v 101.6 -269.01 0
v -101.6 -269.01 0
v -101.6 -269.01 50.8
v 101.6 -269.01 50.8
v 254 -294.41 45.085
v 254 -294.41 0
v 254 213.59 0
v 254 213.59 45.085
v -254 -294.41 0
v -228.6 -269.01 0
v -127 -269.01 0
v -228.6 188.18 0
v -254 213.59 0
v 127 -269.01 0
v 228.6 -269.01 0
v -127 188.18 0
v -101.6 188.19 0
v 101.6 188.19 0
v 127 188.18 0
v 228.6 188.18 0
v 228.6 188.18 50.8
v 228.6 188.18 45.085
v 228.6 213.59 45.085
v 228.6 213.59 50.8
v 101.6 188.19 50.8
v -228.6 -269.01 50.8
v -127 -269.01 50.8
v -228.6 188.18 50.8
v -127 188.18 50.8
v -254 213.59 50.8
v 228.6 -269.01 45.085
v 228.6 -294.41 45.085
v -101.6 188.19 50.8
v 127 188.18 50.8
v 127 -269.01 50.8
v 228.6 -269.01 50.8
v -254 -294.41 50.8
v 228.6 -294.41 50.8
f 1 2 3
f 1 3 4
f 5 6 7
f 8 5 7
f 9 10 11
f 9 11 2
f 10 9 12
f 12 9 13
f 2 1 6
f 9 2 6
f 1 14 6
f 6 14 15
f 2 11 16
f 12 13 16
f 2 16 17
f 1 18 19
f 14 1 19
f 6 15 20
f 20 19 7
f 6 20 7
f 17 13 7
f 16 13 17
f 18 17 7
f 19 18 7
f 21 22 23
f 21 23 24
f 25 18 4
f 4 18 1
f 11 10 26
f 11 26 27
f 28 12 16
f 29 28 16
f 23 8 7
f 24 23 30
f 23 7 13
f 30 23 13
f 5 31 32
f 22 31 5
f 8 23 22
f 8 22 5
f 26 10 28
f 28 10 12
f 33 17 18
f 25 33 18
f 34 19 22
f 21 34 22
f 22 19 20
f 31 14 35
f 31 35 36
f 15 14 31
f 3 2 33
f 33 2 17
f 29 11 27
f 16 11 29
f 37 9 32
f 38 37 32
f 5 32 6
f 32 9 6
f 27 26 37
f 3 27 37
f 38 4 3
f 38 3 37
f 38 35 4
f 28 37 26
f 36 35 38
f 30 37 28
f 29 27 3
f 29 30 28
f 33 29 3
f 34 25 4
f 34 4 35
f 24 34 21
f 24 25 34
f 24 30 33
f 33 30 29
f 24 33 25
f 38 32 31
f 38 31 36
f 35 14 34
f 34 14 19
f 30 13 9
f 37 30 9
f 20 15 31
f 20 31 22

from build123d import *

# Parameters (mm, degrees)
F0_W        = 101.6
F0_H        = 457.1899072886
F0_W_2      = 203.2
F0_H_2      = 25.4
F1_DEPTH    = 50.8
F2_T        = 45.085
F2_T3_DEPTH = 140.97


# Not quite as in the source:
# - a shell that OpenCascade refuses in one call is made with other operations: the cavity is built on its own and cut out


with BuildPart() as f1:
    # F0 (on Top) → F1 (new body)
    with BuildSketch(Plane.XY):
        Polygon((-228.6, 213.5899730921), (-254, 213.5899730921), (-254, 188.1798803806), (-254, -213.5899730921), (-254, -294.4100269079), (-228.6, -294.4100269079), (-127, -294.4100269079), (-101.6, -294.4100269079), (-101.6, -269.0100269079), (-101.6, 188.1798803806), (-101.6, 188.1899730921), (101.6, 188.1899730921), (101.6, -269.0100269079), (101.6, -294.4100269079), (254, -294.4100269079), (254, -269.0100269079), (254, 213.5899730921), (101.6, 213.5899730921), (-101.6, 213.5899730921), (-127, 213.5899730921), align=None)
        with Locations((-177.8, -40.4150732636)):
            Rectangle(F0_W, F0_H, mode=Mode.SUBTRACT)
        with Locations((177.8, -40.4150732636)):
            Rectangle(F0_W, F0_H, mode=Mode.SUBTRACT)
        with Locations((0, -281.7100269079)):
            Rectangle(F0_W_2, F0_H_2)
    extrude(amount=F1_DEPTH)

    # F2: shell of thickness 45.085, made by hand


with BuildPart() as f2_core1:
    # F2_t2: copy of F1
    add(f1.part)

    # the walls: a layer under each face that stays
    f2_faces = [f2_core1.faces().sort_by_distance(p)[0] for p in [
        (-101.6, -40.4100269079, 25.4),
        (0, 188.1899730921, 25.4),
        (0, -269.0100269079, 25.4),
        (-228.6, -40.4150732636, 25.4),
        (-177.8, 188.1798803806, 25.4),
        (-177.8, -269.0100269079, 25.4),
        (177.8, 188.1798803806, 25.4),
        (177.8, -269.0100269079, 25.4),
        (127, -40.4150732636, 25.4),
        (-237.0666666667, -277.4766935746, 0),
    ]]
    thicken(f2_faces, amount=-F2_T, mode=Mode.SUBTRACT)

    # F2_s4 → F2_t3 (cut)
    with BuildSketch(Plane.XY.offset(-45.085)):
        Polygon((-101.14915, -268.5591769079), (-146.685, -269.0100269079), (-146.685, -314.0950269079), (-101.6, -314.0950269079), align=None)
        Polygon((-101.14915, 187.7391230921), (-146.685, 188.1899730921), (-146.685, 233.2749730921), (-101.6, 233.2749730921), align=None)
        Polygon((-228.14915, -268.5591769079), (-273.685, -269.0100269079), (-273.685, -314.0950269079), (-228.6, -314.0950269079), align=None)
        Polygon((-228.14915, 187.7290303806), (-273.685, 188.1798803806), (-273.685, 233.2648803806), (-228.6, 233.2648803806), align=None)
        Polygon((127.45085, 187.7290303806), (127, 233.2648803806), (81.915, 233.2648803806), (81.915, 188.1798803806), align=None)
        Polygon((127.45085, -268.5591769079), (127, -314.0950269079), (81.915, -314.0950269079), (81.915, -269.0100269079), align=None)
    extrude(amount=F2_T3_DEPTH, mode=Mode.SUBTRACT)


with BuildPart() as f1_1:
    add(f1.part)

    # what is left inside the walls is the cavity
    f2_cavity = [f2_core1.part.solids().sort_by_distance(p)[0] for p in [
        (241.3, -125.076694, 45.53585),
    ]]
    add(f2_cavity, mode=Mode.SUBTRACT)


solid = f1_1.part
